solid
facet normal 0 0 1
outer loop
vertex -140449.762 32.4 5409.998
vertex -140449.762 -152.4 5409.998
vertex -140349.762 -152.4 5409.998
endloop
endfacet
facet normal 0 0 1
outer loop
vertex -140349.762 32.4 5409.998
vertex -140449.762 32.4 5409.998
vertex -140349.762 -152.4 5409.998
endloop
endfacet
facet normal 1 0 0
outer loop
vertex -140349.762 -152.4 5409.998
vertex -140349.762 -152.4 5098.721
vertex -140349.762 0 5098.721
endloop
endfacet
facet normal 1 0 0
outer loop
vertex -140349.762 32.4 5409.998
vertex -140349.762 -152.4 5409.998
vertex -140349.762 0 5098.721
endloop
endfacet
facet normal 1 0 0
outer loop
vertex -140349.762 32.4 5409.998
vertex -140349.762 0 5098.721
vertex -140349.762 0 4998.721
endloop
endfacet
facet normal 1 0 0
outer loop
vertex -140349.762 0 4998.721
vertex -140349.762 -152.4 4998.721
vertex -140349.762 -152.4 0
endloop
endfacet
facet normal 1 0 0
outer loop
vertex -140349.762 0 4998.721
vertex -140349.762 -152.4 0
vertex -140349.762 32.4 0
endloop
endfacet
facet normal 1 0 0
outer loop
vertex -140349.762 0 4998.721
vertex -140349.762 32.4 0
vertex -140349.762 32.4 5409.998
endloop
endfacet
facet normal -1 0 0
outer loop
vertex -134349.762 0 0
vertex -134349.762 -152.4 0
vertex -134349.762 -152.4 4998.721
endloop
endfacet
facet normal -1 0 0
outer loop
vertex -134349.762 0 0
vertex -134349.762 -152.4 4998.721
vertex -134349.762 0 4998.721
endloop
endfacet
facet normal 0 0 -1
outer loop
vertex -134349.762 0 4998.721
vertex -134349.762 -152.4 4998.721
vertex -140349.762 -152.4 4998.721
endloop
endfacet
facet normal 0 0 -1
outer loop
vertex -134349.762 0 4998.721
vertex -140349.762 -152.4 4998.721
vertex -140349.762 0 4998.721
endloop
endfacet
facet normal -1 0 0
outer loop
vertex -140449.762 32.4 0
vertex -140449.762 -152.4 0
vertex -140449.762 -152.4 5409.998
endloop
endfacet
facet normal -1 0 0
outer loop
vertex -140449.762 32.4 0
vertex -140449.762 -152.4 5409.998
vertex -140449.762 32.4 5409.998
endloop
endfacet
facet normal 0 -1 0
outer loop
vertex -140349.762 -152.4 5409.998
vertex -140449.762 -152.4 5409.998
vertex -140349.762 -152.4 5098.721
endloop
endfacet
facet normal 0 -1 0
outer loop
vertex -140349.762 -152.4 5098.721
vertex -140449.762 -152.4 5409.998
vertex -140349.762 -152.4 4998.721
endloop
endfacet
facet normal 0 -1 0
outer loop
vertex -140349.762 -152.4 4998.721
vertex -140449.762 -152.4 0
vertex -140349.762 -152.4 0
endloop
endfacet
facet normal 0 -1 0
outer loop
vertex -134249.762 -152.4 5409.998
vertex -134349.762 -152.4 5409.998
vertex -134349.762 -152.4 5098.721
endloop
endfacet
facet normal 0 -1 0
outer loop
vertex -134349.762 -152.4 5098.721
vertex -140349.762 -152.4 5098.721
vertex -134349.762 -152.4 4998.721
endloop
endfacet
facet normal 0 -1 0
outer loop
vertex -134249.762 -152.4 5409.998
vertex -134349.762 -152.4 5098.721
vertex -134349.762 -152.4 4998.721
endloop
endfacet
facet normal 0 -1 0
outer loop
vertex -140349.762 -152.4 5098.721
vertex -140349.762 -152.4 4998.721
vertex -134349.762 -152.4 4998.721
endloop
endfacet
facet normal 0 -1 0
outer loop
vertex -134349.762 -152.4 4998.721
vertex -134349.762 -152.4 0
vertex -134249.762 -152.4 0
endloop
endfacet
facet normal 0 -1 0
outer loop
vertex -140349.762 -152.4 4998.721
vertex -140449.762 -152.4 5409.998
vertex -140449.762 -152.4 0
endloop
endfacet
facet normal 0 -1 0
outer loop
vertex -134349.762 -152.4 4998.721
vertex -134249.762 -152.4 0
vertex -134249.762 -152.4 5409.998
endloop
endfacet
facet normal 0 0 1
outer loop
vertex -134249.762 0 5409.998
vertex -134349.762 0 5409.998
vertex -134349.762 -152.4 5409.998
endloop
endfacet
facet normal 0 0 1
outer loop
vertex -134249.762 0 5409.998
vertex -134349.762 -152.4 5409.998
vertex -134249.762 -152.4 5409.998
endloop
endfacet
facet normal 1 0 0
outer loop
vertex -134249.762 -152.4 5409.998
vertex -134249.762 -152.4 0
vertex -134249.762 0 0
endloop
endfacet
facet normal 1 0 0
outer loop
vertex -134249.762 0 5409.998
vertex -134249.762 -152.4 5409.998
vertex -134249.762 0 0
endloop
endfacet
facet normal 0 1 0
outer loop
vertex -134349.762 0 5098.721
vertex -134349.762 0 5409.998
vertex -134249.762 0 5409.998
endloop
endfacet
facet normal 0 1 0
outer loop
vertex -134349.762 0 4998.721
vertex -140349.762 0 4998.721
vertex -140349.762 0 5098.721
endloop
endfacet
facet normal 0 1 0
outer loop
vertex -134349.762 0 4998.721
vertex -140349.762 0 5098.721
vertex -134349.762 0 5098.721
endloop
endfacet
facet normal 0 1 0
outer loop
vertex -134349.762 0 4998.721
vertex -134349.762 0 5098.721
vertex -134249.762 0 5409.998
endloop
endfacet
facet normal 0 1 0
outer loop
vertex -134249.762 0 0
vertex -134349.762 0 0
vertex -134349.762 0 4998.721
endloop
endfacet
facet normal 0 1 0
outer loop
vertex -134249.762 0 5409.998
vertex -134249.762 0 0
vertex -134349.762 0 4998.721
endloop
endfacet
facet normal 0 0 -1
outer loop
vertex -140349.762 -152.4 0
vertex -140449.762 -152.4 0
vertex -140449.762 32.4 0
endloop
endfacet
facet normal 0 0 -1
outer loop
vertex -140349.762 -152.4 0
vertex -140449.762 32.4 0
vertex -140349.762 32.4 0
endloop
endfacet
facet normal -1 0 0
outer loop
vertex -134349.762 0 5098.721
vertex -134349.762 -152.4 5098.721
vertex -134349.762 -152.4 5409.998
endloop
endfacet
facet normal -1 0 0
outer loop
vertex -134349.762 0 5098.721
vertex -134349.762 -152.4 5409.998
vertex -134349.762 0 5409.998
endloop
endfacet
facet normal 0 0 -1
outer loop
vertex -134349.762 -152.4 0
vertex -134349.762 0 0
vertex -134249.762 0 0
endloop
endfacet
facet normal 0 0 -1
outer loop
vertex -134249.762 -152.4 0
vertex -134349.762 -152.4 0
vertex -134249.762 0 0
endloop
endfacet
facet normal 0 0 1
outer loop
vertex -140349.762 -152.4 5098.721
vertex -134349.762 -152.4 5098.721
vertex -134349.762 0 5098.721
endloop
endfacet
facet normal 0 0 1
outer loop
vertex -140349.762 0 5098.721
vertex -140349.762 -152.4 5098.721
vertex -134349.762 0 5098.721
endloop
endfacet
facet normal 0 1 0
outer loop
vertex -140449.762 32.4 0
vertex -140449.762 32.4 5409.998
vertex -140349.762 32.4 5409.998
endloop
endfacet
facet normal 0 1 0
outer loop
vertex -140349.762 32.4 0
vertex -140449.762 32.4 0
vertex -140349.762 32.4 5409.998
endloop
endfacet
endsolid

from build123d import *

# Parameters (mm, degrees)
SKETCH1_W        = 100
SKETCH1_H        = 184.8
EXTRUDE1_DEPTH   = 5409.9984
SKETCH1_H_2      = 152.4
EXTRUDE1_2_DEPTH = 5409.9984
SKETCH2_W        = 100
SKETCH2_H        = 152.4
EXTRUDE2_DEPTH   = 6000


with BuildPart() as part:
    # Sketch1 → Extrude1 (new body)
    with BuildSketch(Plane.XY):
        with Locations((-140399.761744046, -60)):
            Rectangle(SKETCH1_W, SKETCH1_H)
    extrude(amount=EXTRUDE1_DEPTH)



with BuildPart() as body_2:
    # Sketch1 → Extrude1 2 (new body)
    with BuildSketch(Plane.XY):
        with Locations((-134299.761744046, -76.2)):
            Rectangle(SKETCH1_W, SKETCH1_H_2)
    extrude(amount=EXTRUDE1_2_DEPTH)


with BuildPart() as part_1:
    add(part.part)

    add(body_2.part)  # Extrude2 merges body 2
    # Sketch2 → Extrude2 (add)
    with BuildSketch(Plane.ZY.offset(134349.761744046)):
        with Locations((5048.721352532, -76.2)):
            Rectangle(SKETCH2_W, SKETCH2_H)
    extrude(amount=EXTRUDE2_DEPTH)


solid = part_1.part
